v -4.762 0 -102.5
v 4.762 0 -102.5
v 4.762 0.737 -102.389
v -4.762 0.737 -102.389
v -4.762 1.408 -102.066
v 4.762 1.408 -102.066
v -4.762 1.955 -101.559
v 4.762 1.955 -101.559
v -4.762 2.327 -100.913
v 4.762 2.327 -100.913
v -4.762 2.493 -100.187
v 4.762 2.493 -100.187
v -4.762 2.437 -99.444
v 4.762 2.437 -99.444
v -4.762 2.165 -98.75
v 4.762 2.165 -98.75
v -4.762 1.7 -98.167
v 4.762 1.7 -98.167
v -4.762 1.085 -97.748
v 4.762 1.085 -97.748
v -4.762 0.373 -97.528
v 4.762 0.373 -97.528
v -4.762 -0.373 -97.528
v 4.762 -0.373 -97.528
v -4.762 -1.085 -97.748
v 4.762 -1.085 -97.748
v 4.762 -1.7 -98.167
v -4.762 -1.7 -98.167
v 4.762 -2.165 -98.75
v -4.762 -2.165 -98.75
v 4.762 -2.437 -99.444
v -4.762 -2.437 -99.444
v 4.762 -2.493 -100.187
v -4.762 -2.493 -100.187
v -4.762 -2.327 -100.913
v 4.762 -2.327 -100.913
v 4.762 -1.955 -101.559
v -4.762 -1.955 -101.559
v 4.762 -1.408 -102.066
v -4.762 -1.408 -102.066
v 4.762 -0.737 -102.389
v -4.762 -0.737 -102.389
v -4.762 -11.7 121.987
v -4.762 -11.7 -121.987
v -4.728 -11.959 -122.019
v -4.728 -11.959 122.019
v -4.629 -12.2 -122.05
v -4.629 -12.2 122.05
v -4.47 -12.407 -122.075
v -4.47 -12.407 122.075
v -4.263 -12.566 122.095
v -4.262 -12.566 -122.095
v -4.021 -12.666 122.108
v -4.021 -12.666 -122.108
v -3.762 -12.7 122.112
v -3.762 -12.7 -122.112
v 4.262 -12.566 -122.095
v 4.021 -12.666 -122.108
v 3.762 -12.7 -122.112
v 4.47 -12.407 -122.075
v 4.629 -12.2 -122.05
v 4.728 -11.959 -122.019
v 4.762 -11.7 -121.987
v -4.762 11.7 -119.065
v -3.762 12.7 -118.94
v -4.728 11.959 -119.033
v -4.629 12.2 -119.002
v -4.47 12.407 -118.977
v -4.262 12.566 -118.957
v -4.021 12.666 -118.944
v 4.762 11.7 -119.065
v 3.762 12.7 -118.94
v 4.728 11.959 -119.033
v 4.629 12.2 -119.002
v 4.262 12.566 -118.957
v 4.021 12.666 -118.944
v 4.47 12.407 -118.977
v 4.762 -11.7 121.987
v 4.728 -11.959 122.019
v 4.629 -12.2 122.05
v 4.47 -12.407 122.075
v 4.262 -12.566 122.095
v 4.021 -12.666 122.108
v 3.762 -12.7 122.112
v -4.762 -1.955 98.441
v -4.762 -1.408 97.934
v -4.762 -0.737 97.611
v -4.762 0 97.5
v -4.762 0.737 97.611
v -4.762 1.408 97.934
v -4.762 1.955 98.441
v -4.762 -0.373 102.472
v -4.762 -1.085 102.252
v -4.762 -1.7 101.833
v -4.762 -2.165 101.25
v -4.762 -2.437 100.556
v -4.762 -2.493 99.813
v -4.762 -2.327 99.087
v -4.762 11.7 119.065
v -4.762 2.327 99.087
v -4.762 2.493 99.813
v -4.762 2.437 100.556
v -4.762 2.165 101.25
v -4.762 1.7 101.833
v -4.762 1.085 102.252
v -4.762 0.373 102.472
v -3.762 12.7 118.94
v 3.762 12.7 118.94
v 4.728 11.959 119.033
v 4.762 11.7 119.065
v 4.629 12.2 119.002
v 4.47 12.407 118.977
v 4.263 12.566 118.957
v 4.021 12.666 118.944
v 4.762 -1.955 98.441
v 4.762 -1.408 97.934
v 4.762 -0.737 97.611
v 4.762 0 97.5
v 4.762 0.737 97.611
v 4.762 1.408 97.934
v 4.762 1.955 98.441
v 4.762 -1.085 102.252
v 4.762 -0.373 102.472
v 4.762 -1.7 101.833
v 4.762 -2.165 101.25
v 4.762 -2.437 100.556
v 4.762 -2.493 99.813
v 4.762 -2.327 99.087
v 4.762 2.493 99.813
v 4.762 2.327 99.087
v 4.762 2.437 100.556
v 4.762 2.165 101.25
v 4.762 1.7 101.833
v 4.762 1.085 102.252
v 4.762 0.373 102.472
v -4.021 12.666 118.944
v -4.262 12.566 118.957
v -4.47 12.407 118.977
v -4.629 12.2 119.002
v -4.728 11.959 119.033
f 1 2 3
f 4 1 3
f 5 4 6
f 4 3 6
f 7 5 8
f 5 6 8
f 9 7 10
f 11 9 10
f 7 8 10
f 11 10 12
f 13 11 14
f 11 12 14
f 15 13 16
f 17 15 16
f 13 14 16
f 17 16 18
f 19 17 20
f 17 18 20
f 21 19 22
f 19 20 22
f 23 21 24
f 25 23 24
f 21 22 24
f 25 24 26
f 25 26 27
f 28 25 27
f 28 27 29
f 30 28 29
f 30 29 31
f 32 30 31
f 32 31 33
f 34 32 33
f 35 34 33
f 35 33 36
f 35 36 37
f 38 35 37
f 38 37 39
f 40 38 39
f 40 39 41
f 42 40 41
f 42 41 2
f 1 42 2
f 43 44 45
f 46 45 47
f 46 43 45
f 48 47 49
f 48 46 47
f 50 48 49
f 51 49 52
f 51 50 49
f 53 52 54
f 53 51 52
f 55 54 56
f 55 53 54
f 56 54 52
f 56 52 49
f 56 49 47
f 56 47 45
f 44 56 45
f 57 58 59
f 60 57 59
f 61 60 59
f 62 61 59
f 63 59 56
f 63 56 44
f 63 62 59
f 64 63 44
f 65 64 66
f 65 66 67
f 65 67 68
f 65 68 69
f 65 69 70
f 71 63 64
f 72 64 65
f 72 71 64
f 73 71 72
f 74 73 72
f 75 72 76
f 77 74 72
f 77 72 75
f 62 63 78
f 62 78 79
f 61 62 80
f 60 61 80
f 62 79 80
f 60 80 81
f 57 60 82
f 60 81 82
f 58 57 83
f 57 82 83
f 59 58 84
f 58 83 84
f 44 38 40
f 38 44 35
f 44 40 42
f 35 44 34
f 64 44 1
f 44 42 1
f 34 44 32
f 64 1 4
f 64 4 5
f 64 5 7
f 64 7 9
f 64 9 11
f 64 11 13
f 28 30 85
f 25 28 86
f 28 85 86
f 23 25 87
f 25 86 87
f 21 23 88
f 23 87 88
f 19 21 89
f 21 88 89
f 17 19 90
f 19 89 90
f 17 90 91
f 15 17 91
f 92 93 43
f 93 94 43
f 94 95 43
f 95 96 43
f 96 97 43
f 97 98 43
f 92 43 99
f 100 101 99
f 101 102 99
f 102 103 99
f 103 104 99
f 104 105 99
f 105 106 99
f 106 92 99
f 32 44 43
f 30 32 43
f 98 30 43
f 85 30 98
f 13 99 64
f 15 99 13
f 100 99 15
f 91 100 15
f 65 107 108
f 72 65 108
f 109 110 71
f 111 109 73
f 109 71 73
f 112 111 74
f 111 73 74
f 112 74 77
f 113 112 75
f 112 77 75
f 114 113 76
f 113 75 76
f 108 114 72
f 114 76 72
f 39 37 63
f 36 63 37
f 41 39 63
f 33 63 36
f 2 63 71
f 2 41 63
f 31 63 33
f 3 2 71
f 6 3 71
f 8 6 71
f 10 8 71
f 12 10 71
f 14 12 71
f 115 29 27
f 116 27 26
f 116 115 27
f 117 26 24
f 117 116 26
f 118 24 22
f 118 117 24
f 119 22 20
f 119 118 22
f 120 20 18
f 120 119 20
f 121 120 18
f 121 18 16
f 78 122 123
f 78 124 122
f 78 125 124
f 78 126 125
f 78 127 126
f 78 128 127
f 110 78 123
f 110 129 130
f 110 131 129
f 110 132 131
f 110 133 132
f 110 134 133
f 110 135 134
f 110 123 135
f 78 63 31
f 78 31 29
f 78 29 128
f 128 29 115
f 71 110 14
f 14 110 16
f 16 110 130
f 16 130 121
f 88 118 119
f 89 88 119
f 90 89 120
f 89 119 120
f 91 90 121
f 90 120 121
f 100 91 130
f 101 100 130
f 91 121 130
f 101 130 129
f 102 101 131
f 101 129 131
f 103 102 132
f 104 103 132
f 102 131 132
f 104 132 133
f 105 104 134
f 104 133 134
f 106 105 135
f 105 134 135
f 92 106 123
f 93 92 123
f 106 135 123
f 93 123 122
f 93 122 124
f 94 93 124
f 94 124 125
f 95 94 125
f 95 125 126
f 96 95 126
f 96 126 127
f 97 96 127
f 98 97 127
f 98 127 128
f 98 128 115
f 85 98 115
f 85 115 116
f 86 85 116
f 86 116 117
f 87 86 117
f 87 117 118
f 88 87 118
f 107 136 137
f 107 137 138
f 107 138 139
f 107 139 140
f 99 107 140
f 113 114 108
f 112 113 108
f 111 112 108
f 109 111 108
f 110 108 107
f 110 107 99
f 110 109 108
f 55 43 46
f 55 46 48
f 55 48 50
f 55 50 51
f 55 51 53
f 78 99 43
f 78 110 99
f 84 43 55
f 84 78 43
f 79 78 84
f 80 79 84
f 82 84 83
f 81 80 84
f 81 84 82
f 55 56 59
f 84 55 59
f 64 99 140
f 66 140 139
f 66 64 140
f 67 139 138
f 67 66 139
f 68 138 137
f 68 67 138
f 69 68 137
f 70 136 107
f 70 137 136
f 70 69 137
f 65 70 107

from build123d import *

# Parameters (mm, degrees)
ESBO_O1_W                 = 9.525
ESBO_O1_H                 = 25.4
RESSALTO_EXTRUS_O1_DEPTH  = 210
FILETE1_R                 = 1
CORTE_EXTRUS_O1_START     = -9.525
CORTE_EXTRUS_O1_DEPTH     = 9.525
FURO_ROSCADO_DE_M6X1_01_D = 5


# Read off the part's stored shape, not the designer's step: Corte-extrusão1
with BuildPart() as part:
    # Esboço1 → Ressalto-extrusão1 (new, symmetric)
    with BuildSketch(Plane.XY):
        Rectangle(ESBO_O1_W, ESBO_O1_H)
    extrude(amount=RESSALTO_EXTRUS_O1_DEPTH, both=True)

    # Filete1
    filete1_edges = [part.edges().sort_by_distance(p)[0] for p in [
        (4.7625, -12.7, 0),
        (-4.7625, -12.7, 0),
        (-4.7625, 12.7, 0),
        (4.7625, 12.7, 0),
    ]]
    fillet(filete1_edges, radius=FILETE1_R)

    # Corte-extrusão1 outline → Corte-extrusão1 (cut)
    with BuildSketch(Plane.ZY.offset(4.7625).offset(CORTE_EXTRUS_O1_START)):
        Polygon((118.94, 12.7), (122.111992176, -12.7), (210, -12.7), (210, 12.7), align=None)
        Polygon((-210, -12.7), (-122.111992176, -12.7), (-118.94, 12.7), (-210, 12.7), align=None)
    extrude(amount=CORTE_EXTRUS_O1_DEPTH, mode=Mode.SUBTRACT)

    # Furo roscado de M6x1.01 (through all)
    with Locations(Plane.ZY.offset(4.7625)):
        with Locations((-100, 0), (100, 0)):
            Hole(FURO_ROSCADO_DE_M6X1_01_D / 2)


solid = part.part
